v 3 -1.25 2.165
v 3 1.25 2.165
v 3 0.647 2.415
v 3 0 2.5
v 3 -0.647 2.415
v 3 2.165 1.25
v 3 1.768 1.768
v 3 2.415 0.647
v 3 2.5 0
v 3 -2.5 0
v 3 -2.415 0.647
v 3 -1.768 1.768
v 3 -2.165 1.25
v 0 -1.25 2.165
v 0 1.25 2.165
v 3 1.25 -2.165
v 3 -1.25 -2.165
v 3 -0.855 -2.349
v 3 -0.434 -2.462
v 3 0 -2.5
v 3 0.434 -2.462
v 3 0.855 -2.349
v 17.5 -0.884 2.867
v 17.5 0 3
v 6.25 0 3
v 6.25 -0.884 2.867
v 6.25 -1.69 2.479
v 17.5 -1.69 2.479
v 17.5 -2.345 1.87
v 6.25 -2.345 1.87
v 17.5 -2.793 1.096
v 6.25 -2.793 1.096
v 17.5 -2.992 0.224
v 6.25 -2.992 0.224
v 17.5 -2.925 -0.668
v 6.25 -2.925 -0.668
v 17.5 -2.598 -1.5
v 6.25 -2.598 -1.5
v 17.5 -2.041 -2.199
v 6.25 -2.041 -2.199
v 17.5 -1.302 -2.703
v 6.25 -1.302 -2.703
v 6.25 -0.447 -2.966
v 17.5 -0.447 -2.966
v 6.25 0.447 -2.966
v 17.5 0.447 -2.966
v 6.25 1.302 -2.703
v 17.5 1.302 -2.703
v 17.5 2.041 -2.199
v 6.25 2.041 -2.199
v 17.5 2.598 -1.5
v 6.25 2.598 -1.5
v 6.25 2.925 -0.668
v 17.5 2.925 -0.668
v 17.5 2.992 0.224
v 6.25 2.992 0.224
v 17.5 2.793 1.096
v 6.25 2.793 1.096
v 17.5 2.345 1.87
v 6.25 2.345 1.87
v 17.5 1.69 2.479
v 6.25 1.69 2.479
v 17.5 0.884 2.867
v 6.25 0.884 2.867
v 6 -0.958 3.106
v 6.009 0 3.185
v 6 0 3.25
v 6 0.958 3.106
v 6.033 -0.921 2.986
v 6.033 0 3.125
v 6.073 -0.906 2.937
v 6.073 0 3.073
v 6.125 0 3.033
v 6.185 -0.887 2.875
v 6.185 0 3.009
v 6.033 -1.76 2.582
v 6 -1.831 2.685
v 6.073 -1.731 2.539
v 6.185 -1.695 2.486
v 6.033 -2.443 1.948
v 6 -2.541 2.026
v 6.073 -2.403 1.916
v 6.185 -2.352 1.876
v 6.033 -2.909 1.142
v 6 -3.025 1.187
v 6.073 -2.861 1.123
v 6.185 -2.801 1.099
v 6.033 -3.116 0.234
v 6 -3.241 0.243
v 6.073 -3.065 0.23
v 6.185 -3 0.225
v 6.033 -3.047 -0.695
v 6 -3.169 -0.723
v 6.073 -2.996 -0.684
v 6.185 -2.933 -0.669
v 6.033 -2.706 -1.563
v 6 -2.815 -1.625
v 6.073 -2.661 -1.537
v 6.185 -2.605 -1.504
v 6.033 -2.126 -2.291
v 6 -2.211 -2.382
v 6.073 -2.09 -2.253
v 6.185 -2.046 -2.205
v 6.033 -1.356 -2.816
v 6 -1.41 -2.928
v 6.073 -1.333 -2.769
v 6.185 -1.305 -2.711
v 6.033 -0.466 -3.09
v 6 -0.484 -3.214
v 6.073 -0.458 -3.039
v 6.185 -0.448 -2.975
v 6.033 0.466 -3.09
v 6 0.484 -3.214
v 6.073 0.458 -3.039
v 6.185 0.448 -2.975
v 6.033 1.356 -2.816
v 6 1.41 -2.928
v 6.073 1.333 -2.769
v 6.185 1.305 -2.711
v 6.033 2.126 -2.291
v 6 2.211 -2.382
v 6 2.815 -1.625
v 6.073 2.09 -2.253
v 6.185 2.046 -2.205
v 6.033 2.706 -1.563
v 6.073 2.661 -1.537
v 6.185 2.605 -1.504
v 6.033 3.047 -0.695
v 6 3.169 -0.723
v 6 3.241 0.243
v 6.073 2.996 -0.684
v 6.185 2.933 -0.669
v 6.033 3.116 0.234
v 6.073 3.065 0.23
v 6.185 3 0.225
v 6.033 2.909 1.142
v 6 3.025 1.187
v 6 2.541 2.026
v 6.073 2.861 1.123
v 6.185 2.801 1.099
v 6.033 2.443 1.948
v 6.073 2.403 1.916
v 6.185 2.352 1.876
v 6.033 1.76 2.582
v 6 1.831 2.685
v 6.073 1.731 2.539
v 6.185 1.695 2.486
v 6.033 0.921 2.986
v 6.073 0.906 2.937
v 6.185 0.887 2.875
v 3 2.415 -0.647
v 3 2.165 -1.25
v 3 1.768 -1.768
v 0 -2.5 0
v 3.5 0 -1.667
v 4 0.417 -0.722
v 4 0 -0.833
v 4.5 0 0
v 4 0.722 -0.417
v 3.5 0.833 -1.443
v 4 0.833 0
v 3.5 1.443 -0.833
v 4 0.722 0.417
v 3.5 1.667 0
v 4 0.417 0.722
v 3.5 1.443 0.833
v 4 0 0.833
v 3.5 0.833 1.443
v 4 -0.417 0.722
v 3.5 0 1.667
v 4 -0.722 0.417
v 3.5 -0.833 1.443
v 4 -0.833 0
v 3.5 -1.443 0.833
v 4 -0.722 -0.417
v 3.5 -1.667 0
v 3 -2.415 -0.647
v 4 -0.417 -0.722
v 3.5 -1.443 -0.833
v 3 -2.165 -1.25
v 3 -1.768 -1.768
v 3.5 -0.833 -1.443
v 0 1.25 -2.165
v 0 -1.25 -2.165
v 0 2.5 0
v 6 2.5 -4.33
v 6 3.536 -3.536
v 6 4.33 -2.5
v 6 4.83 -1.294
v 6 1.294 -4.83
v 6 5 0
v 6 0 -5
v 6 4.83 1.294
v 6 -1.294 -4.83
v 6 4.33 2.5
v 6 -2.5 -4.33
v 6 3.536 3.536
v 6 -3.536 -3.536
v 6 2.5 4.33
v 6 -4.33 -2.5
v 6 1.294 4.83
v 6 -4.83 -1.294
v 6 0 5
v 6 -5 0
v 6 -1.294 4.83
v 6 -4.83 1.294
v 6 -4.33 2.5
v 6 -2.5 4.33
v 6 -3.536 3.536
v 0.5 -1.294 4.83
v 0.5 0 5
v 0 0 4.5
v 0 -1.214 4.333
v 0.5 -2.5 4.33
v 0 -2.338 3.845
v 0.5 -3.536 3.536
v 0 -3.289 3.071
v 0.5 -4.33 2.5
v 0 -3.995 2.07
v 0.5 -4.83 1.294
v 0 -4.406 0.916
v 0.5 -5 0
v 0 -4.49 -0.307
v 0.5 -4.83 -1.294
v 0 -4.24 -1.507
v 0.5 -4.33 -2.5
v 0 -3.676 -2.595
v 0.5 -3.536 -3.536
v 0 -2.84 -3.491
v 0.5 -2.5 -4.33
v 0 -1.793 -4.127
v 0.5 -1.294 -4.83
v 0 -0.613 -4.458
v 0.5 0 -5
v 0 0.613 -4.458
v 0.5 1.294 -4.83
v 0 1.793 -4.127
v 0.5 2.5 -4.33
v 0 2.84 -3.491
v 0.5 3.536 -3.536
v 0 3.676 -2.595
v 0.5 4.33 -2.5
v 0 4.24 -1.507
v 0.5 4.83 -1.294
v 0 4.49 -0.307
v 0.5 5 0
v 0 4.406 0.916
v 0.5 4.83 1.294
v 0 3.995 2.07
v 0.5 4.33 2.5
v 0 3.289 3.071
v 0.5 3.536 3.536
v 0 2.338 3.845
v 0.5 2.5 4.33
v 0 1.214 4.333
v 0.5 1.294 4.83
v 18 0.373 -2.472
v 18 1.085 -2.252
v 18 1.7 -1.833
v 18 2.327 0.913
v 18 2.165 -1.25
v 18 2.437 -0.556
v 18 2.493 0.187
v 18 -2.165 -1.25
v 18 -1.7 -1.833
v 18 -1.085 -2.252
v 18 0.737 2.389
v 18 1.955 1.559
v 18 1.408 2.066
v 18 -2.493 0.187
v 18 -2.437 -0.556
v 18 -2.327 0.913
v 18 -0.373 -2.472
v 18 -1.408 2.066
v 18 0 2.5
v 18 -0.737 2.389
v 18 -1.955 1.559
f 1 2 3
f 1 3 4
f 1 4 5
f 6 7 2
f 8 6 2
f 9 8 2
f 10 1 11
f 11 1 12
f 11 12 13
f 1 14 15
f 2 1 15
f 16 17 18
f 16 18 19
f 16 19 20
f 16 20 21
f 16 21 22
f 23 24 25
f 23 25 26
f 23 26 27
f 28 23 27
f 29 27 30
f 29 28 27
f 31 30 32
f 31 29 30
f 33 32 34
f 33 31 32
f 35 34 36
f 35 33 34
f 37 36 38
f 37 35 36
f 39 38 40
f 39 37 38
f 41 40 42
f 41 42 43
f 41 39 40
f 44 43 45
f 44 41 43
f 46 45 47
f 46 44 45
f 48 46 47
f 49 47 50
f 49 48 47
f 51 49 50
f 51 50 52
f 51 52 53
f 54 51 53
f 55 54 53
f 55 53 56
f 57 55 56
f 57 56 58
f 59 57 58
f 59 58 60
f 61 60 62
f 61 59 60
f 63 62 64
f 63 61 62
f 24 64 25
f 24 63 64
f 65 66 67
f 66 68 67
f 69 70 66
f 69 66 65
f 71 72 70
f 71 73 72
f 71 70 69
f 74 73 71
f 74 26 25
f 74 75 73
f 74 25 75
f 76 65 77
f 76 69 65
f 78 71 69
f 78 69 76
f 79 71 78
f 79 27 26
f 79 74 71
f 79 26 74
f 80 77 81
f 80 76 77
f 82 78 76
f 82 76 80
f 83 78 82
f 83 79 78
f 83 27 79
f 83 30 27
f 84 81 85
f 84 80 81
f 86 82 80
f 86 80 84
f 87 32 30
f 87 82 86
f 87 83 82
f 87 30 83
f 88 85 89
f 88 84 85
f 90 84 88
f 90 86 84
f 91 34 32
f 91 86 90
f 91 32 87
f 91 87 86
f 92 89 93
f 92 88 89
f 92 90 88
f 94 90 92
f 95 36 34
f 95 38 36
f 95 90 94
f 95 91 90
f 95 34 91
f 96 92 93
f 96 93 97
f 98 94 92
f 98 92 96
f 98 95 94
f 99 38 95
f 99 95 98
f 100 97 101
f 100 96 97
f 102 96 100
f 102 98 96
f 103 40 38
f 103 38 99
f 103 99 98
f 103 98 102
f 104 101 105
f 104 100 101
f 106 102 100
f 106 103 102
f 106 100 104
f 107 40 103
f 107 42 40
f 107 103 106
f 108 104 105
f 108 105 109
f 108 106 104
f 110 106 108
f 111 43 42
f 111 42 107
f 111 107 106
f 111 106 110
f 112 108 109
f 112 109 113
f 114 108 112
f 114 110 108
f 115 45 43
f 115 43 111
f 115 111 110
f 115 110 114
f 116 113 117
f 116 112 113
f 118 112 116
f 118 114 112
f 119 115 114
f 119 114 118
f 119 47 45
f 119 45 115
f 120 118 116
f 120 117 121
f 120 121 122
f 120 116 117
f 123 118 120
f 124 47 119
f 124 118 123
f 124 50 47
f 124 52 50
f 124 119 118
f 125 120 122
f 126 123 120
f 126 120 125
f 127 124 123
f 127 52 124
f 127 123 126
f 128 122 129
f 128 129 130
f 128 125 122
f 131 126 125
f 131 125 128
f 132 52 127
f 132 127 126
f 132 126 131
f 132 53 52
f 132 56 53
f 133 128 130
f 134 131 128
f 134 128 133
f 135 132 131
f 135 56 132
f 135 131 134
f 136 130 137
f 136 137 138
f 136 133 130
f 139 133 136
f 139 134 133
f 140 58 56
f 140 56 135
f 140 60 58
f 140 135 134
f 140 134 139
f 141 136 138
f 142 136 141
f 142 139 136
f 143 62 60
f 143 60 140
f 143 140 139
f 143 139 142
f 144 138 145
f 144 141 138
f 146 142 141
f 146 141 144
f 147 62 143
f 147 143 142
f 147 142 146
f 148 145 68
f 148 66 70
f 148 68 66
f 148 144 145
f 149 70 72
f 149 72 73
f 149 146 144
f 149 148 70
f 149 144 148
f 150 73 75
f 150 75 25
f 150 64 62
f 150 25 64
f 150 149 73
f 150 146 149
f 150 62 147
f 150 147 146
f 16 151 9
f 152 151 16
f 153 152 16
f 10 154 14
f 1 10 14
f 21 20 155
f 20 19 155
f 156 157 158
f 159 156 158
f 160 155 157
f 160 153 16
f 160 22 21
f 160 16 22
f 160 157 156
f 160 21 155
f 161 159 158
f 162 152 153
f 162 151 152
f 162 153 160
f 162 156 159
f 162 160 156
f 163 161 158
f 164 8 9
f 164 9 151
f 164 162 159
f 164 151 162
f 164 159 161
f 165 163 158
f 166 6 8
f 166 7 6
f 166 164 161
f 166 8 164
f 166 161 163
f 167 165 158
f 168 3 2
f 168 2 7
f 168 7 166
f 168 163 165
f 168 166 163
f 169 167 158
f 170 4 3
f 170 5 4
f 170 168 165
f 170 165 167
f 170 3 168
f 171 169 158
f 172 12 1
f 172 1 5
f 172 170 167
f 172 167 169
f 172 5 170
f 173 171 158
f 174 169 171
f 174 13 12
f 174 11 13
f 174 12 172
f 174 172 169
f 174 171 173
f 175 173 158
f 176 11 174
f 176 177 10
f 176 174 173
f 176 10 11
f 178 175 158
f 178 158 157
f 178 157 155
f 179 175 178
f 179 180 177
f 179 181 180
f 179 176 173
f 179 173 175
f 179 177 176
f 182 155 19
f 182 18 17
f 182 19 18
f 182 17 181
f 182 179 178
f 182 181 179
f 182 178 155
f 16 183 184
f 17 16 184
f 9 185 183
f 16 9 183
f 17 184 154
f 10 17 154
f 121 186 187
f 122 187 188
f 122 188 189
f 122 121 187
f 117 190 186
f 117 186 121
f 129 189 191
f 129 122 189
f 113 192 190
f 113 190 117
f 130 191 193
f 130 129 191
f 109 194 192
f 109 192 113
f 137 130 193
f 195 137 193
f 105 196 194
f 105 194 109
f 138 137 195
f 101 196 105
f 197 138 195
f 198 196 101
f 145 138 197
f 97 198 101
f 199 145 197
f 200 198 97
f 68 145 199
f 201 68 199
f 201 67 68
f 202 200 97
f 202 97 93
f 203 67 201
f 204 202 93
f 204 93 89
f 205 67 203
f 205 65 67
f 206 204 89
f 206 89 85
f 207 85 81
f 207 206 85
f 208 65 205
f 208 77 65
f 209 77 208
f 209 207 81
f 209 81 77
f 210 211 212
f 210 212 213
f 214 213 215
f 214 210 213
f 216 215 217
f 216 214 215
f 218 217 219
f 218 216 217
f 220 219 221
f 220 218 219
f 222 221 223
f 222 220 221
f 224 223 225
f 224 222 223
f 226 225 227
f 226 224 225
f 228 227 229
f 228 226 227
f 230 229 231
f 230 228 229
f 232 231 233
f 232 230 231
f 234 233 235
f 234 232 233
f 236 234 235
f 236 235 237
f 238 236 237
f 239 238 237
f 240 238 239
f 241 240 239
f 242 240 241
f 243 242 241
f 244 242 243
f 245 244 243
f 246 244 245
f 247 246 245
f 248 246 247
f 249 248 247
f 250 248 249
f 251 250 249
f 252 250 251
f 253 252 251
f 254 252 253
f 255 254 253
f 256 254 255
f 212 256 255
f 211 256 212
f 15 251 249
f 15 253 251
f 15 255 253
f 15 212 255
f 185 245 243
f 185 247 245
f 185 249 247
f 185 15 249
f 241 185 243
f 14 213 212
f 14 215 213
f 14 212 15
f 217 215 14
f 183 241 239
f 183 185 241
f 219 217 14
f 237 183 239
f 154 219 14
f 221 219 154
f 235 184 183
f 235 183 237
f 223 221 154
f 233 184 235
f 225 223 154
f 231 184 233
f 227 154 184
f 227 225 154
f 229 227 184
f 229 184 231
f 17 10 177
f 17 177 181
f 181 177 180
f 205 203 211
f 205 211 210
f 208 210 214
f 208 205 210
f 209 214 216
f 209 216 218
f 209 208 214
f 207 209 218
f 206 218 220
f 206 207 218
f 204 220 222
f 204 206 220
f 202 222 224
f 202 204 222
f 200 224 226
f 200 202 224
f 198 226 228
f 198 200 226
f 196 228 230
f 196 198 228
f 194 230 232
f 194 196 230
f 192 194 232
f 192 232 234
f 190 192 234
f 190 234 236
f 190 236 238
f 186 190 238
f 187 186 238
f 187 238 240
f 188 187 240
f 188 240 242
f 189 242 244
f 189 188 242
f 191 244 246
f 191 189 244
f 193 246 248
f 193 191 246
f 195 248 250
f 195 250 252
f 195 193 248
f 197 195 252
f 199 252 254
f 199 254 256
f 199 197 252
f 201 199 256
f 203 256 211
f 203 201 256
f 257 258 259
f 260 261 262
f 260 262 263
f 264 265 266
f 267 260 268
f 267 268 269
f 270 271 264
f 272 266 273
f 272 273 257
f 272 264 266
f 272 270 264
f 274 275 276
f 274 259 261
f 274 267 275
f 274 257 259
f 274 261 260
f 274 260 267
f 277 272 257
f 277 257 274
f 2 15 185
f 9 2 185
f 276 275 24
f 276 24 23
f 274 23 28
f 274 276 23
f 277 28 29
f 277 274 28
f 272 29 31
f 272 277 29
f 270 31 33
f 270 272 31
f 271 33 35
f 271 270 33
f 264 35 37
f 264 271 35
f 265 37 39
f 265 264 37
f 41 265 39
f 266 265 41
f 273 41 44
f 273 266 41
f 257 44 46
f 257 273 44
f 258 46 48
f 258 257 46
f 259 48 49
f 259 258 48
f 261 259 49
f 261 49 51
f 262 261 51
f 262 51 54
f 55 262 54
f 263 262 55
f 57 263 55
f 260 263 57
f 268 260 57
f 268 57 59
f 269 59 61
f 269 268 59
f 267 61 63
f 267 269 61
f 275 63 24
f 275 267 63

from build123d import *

# Parameters (mm, degrees)
CHAMFER1_SIZE      = 0.5
CUT_EXTRUDE1_DEPTH = 3


with BuildPart() as part:
    # Sketch1 → Revolve1 (revolve)
    with BuildSketch(Plane.XY, mode=Mode.PRIVATE) as revolve1_sk:
        with BuildLine():
            Line((0, 0), (0, 5))
            Line((0, 5), (6, 5))
            Line((6, 5), (6, 3.25))
            ThreePointArc((6, 3.25), (6.073223305, 3.073223305), (6.25, 3))
            Line((6.25, 3), (18, 3))
            Line((18, 3), (18, 0))
            Line((18, 0), (0, 0))
        make_face()
    revolve(revolve1_sk.sketch.rotate(Axis((0, 0, 0), (1, 0, 0)), 90), axis=Axis((0, 0, 0), (1, 0, 0)))

    # Chamfer1
    chamfer1_edges = [part.edges().sort_by_distance(p)[0] for p in [
        (0, 0, -5),
        (18, 0, -3),
    ]]
    chamfer(chamfer1_edges, length=CHAMFER1_SIZE)

    # Sketch2 → Cut-Extrude1 (cut)
    with BuildSketch(Plane.ZY):
        Polygon((0, -2.5), (2.165063509, -1.25), (2.165063509, 1.25), (0, 2.5), (-2.165063509, 1.25), (-2.165063509, -1.25), align=None)
    extrude(amount=-CUT_EXTRUDE1_DEPTH, mode=Mode.SUBTRACT)

    # Sketch3 → Cut-Revolve1 (revolve, cut)
    with BuildSketch(Plane.XY, mode=Mode.PRIVATE) as cut_revolve1_sk:
        Polygon((3, 2.5), (3, 0), (4.5, 0), align=None)
    revolve(cut_revolve1_sk.sketch.rotate(Axis((3, 0, 0), (1, 0, 0)), 270), axis=Axis((3, 0, 0), (1, 0, 0)), mode=Mode.SUBTRACT)


solid = part.part
